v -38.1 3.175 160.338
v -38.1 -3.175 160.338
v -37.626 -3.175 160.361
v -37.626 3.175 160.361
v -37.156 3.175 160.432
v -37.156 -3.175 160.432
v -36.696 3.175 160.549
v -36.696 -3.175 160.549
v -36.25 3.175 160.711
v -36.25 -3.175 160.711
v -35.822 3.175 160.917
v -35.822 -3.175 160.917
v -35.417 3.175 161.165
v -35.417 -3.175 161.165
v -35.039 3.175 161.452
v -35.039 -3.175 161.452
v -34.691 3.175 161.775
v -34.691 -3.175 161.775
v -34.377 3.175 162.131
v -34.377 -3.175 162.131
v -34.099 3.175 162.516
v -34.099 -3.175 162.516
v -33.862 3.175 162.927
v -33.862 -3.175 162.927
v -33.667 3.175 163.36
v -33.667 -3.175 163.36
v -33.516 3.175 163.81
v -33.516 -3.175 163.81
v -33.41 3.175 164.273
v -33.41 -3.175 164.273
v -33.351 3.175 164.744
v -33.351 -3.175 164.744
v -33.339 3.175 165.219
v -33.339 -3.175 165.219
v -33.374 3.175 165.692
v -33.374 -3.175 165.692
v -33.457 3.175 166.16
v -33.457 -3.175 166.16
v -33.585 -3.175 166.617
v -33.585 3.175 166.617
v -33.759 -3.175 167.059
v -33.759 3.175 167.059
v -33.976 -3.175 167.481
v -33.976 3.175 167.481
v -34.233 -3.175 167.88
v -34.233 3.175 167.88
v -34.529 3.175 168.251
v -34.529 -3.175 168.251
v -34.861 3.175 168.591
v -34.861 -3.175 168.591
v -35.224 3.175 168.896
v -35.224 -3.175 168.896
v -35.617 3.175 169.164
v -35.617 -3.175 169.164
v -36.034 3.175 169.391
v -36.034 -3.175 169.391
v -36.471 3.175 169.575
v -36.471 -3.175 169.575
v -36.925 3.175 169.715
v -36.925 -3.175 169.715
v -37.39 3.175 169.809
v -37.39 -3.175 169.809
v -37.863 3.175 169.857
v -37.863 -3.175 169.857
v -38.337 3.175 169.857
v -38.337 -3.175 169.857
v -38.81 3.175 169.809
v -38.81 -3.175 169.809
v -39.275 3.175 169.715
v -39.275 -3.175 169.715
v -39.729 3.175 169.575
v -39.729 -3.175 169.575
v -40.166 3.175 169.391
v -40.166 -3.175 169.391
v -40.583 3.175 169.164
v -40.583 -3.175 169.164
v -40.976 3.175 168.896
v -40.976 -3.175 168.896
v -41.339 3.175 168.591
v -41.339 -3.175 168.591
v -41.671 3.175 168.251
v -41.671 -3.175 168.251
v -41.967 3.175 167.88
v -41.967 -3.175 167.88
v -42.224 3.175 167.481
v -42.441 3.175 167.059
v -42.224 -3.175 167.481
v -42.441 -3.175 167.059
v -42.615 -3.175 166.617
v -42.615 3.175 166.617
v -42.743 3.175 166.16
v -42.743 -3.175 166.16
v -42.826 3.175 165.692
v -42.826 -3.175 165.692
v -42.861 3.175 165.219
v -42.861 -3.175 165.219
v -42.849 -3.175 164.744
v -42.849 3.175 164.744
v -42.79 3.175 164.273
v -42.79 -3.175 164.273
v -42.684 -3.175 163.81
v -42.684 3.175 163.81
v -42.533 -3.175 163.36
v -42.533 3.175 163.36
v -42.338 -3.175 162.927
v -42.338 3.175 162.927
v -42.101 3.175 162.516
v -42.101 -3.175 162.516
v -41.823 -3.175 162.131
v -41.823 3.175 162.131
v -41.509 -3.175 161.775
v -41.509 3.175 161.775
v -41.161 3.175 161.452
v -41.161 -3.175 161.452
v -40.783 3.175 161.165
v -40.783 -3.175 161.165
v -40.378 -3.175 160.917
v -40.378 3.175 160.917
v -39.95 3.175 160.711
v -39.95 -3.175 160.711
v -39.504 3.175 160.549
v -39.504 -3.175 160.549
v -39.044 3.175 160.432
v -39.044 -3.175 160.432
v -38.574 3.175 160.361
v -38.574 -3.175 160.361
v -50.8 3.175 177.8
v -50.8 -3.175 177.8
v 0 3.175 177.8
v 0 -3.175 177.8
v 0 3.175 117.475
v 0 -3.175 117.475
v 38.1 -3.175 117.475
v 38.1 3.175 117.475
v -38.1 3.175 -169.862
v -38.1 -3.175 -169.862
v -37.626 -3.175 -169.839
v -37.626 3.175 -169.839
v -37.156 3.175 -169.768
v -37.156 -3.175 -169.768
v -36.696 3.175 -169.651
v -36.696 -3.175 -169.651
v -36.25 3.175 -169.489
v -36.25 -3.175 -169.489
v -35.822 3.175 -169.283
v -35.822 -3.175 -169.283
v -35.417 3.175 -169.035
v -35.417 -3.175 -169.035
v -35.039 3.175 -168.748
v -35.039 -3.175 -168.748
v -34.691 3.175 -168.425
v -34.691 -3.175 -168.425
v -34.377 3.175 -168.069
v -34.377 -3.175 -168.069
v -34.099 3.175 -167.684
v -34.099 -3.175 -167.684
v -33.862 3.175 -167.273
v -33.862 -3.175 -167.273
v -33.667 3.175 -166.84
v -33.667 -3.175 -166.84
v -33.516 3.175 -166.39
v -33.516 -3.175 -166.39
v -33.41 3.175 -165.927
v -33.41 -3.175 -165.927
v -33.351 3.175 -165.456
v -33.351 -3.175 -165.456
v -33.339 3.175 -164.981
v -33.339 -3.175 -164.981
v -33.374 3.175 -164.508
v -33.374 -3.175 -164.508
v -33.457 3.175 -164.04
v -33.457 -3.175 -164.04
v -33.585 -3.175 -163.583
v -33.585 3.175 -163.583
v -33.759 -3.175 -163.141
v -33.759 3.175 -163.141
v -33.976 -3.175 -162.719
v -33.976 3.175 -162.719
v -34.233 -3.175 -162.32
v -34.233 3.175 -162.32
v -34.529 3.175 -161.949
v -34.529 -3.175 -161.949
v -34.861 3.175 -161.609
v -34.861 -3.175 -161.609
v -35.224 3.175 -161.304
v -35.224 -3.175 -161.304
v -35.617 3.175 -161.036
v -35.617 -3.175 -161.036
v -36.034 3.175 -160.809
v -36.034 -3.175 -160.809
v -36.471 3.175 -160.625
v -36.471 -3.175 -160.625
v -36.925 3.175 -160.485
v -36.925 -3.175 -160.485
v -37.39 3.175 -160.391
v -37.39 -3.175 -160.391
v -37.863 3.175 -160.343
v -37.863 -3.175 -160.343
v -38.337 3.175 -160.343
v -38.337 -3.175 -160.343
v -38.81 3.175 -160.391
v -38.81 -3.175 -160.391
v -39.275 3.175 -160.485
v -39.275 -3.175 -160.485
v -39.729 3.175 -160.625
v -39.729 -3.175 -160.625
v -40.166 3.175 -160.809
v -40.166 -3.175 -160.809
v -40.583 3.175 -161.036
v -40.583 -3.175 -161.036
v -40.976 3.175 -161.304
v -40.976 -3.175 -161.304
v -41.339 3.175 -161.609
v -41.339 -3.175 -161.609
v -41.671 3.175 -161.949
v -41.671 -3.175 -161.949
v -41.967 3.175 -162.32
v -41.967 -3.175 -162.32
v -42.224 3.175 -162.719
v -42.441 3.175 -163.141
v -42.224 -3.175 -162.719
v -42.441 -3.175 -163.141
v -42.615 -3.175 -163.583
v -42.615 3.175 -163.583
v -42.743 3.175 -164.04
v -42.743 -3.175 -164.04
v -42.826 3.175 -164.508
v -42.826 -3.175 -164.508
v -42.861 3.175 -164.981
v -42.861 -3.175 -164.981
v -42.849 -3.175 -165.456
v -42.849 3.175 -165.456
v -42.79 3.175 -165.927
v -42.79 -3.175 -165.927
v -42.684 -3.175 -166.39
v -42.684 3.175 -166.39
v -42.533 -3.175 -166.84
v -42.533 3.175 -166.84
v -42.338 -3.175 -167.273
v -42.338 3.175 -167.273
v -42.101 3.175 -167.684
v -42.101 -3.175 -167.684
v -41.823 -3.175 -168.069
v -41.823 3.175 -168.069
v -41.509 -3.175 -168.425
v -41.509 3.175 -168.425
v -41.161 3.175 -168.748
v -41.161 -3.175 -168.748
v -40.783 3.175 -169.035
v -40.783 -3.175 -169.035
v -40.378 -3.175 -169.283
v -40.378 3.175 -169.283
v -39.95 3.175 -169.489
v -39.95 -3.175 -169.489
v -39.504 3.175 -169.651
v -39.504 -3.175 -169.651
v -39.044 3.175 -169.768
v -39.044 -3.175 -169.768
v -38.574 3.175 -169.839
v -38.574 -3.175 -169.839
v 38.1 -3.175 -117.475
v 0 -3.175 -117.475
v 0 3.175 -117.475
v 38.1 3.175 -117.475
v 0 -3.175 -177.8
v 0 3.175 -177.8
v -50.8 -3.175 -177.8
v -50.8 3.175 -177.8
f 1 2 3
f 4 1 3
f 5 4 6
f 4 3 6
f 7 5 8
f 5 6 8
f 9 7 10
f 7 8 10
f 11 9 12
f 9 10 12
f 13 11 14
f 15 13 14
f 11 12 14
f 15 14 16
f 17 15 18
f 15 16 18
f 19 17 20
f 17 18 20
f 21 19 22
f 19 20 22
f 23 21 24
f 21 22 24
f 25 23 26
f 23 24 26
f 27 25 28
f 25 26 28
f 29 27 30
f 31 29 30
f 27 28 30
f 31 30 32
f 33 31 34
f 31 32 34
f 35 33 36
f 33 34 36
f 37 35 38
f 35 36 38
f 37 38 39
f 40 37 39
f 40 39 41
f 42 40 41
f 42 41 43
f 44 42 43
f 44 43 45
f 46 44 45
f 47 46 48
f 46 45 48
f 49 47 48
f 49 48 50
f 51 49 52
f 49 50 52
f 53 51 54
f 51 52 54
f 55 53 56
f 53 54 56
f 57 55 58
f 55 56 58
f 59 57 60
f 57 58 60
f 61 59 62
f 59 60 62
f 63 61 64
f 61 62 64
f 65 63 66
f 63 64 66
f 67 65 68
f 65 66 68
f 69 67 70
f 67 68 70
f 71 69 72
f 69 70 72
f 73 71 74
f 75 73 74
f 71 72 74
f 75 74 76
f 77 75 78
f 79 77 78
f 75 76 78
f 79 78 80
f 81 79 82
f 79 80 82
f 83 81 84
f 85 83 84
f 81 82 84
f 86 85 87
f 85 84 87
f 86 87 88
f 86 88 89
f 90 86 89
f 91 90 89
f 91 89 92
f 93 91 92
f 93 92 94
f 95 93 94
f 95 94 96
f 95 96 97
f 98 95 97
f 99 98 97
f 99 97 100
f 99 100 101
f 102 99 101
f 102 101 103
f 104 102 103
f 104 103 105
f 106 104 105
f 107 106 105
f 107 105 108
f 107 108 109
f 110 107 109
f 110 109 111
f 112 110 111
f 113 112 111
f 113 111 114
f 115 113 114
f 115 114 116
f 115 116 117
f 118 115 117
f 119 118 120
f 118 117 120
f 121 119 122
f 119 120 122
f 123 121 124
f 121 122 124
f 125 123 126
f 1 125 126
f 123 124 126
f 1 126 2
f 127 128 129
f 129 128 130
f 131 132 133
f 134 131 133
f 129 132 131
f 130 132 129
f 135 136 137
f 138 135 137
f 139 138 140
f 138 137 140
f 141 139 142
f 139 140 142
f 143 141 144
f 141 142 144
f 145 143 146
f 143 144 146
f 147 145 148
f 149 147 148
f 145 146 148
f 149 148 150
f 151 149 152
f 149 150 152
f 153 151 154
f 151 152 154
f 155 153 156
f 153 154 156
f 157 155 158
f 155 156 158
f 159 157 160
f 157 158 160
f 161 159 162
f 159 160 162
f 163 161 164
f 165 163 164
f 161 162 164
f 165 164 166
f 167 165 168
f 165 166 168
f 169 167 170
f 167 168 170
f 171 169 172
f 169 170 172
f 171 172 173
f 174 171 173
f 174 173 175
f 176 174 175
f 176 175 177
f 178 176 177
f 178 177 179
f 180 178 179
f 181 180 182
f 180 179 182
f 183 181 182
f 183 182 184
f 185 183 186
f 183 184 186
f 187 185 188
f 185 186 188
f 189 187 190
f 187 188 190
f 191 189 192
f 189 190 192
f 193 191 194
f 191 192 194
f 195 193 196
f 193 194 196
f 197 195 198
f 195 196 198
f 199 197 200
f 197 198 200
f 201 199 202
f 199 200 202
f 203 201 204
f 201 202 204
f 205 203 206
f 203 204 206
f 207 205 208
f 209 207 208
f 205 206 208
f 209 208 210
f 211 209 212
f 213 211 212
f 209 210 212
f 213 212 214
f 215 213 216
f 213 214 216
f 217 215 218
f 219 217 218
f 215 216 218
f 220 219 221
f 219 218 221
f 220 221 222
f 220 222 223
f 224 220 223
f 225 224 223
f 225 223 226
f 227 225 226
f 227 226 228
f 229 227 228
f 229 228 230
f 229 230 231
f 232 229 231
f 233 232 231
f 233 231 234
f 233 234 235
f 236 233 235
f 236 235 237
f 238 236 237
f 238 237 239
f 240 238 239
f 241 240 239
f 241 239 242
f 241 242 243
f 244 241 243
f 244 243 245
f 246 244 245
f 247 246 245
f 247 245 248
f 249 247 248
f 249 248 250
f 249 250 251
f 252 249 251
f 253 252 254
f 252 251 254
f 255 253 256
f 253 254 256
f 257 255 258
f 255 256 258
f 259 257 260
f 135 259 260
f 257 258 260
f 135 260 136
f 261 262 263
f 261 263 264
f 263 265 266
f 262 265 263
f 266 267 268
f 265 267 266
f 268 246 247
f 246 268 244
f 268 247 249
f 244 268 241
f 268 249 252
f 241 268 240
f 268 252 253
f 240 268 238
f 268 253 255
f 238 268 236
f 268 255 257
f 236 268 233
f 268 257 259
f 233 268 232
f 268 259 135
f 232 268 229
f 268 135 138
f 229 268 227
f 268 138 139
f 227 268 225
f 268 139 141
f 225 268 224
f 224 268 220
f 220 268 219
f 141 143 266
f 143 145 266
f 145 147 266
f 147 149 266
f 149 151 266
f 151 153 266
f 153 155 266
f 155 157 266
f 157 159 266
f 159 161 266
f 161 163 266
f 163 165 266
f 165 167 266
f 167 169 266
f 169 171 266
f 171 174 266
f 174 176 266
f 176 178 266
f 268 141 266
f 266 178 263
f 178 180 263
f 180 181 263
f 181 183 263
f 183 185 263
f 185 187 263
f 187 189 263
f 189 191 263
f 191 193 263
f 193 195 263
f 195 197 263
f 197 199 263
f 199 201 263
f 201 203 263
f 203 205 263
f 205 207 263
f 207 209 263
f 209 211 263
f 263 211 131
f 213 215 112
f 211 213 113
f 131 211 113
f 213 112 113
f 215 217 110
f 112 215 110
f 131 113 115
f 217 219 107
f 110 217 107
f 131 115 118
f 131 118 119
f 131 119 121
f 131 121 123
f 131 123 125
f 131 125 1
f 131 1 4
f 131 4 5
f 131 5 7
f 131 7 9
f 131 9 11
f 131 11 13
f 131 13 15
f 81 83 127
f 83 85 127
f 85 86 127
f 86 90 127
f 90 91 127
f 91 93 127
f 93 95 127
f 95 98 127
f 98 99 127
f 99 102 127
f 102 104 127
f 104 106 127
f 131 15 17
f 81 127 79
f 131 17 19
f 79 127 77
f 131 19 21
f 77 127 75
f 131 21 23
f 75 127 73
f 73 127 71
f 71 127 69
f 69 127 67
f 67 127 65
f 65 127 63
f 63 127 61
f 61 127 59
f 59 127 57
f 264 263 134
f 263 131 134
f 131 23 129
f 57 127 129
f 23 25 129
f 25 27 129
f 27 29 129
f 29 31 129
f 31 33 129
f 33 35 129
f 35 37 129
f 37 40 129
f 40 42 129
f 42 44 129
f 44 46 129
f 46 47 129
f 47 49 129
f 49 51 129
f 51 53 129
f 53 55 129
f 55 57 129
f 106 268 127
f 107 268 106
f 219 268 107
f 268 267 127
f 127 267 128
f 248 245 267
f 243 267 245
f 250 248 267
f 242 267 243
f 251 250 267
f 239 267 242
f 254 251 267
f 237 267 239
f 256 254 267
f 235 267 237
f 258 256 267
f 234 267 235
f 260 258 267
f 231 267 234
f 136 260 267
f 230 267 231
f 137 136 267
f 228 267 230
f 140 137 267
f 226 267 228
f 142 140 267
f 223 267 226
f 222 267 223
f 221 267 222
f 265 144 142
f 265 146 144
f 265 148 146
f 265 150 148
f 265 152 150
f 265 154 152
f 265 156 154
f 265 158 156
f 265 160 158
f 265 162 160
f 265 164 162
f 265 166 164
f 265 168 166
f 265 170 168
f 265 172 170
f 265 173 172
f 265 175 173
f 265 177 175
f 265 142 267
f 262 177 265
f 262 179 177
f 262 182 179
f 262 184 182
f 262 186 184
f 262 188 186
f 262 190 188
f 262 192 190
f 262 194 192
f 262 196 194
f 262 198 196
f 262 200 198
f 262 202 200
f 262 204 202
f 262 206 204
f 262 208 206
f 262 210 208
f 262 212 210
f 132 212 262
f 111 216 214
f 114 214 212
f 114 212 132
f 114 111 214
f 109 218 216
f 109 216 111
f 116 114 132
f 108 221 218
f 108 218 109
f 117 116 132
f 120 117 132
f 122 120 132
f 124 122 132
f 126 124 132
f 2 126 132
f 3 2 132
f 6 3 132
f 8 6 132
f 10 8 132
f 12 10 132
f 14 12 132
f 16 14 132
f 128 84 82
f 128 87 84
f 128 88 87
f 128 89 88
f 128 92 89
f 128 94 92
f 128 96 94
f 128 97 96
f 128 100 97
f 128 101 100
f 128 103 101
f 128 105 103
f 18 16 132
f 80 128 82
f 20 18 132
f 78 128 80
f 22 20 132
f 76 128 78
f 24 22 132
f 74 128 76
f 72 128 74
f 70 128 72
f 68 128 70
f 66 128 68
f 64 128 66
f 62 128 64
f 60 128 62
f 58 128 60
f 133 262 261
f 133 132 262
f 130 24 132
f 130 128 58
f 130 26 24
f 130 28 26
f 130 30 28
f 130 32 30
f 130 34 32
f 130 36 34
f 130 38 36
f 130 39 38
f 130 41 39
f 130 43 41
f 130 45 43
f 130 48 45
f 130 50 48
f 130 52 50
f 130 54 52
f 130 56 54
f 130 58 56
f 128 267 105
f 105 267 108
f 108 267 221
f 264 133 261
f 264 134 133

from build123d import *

# Parameters (mm, degrees)
SKETCH1_W                   = 165.1
SKETCH1_H                   = 38.1
BOSS_EXTRUDE1_DEPTH         = 3.175
F_1_4_0_25_DIAMETER_HOLE1_D = 7.9375
SKETCH4_W                   = 50.8
SKETCH4_H                   = 355.6
SKETCH4_R                   = 4.7625
BOSS_EXTRUDE2_DEPTH         = 6.35
SKETCH5_W                   = 165.1
SKETCH5_H                   = 76.2
CUT_EXTRUDE1_DEPTH          = 271.08036304
SKETCH6_W                   = 38.1
SKETCH6_H                   = 60.325
CUT_EXTRUDE2_DEPTH          = 186.023789011


with BuildPart() as part:
    # Sketch1 → Boss-Extrude1 (new, symmetric)
    with BuildSketch(Plane(origin=(0, 0, 0), x_dir=(1, 0, 0), z_dir=(0, 1, 0))):
        Polygon((0, 0), (0, -177.8), (38.1, -177.8), (38.1, -38.1), (38.1, 0), align=None)
        with Locations((120.65, -19.05)):
            Rectangle(SKETCH1_W, SKETCH1_H)
        with Locations((120.65, 19.05)):
            Rectangle(SKETCH1_W, SKETCH1_H)
        Polygon((0, 177.8), (0, 0), (38.1, 0), (38.1, 38.1), (38.1, 177.8), align=None)
    extrude(amount=BOSS_EXTRUDE1_DEPTH, both=True)

    # 1/4 (0.25) Diameter Hole1 (through all)
    with Locations(Plane(origin=(0, 3.175, 0), x_dir=(1, 0, 0), z_dir=(0, 1, 0))):
        with Locations((190.5, 25.4), (190.5, -25.4)):
            Hole(F_1_4_0_25_DIAMETER_HOLE1_D / 2)

    # Sketch4 → Boss-Extrude2 (add)
    with BuildSketch(Plane.XZ.offset(3.175)):
        with Locations((-25.4, 0)):
            Rectangle(SKETCH4_W, SKETCH4_H)
        with Locations(Location((-38.1, -165.1, 0), (0, 0, 270))):
            Circle(SKETCH4_R, mode=Mode.SUBTRACT)
        with Locations(Location((-38.1, 165.1, 0), (0, 0, 270))):
            Circle(SKETCH4_R, mode=Mode.SUBTRACT)
    extrude(amount=-BOSS_EXTRUDE2_DEPTH)

    # Sketch5 → Cut-Extrude1 (cut, through all)
    with BuildSketch(Plane.XZ.offset(3.175)):
        with Locations((120.65, 0)):
            Rectangle(SKETCH5_W, SKETCH5_H)
    extrude(amount=-CUT_EXTRUDE1_DEPTH, mode=Mode.SUBTRACT)

    # Sketch6 → Cut-Extrude2 (cut, through all)
    with BuildSketch(Plane.XZ.offset(3.175)):
        with Locations((19.05, 147.6375)):
            Rectangle(SKETCH6_W, SKETCH6_H)
        with Locations((19.05, -147.6375)):
            Rectangle(SKETCH6_W, SKETCH6_H)
    extrude(amount=-CUT_EXTRUDE2_DEPTH, mode=Mode.SUBTRACT)


solid = part.part
